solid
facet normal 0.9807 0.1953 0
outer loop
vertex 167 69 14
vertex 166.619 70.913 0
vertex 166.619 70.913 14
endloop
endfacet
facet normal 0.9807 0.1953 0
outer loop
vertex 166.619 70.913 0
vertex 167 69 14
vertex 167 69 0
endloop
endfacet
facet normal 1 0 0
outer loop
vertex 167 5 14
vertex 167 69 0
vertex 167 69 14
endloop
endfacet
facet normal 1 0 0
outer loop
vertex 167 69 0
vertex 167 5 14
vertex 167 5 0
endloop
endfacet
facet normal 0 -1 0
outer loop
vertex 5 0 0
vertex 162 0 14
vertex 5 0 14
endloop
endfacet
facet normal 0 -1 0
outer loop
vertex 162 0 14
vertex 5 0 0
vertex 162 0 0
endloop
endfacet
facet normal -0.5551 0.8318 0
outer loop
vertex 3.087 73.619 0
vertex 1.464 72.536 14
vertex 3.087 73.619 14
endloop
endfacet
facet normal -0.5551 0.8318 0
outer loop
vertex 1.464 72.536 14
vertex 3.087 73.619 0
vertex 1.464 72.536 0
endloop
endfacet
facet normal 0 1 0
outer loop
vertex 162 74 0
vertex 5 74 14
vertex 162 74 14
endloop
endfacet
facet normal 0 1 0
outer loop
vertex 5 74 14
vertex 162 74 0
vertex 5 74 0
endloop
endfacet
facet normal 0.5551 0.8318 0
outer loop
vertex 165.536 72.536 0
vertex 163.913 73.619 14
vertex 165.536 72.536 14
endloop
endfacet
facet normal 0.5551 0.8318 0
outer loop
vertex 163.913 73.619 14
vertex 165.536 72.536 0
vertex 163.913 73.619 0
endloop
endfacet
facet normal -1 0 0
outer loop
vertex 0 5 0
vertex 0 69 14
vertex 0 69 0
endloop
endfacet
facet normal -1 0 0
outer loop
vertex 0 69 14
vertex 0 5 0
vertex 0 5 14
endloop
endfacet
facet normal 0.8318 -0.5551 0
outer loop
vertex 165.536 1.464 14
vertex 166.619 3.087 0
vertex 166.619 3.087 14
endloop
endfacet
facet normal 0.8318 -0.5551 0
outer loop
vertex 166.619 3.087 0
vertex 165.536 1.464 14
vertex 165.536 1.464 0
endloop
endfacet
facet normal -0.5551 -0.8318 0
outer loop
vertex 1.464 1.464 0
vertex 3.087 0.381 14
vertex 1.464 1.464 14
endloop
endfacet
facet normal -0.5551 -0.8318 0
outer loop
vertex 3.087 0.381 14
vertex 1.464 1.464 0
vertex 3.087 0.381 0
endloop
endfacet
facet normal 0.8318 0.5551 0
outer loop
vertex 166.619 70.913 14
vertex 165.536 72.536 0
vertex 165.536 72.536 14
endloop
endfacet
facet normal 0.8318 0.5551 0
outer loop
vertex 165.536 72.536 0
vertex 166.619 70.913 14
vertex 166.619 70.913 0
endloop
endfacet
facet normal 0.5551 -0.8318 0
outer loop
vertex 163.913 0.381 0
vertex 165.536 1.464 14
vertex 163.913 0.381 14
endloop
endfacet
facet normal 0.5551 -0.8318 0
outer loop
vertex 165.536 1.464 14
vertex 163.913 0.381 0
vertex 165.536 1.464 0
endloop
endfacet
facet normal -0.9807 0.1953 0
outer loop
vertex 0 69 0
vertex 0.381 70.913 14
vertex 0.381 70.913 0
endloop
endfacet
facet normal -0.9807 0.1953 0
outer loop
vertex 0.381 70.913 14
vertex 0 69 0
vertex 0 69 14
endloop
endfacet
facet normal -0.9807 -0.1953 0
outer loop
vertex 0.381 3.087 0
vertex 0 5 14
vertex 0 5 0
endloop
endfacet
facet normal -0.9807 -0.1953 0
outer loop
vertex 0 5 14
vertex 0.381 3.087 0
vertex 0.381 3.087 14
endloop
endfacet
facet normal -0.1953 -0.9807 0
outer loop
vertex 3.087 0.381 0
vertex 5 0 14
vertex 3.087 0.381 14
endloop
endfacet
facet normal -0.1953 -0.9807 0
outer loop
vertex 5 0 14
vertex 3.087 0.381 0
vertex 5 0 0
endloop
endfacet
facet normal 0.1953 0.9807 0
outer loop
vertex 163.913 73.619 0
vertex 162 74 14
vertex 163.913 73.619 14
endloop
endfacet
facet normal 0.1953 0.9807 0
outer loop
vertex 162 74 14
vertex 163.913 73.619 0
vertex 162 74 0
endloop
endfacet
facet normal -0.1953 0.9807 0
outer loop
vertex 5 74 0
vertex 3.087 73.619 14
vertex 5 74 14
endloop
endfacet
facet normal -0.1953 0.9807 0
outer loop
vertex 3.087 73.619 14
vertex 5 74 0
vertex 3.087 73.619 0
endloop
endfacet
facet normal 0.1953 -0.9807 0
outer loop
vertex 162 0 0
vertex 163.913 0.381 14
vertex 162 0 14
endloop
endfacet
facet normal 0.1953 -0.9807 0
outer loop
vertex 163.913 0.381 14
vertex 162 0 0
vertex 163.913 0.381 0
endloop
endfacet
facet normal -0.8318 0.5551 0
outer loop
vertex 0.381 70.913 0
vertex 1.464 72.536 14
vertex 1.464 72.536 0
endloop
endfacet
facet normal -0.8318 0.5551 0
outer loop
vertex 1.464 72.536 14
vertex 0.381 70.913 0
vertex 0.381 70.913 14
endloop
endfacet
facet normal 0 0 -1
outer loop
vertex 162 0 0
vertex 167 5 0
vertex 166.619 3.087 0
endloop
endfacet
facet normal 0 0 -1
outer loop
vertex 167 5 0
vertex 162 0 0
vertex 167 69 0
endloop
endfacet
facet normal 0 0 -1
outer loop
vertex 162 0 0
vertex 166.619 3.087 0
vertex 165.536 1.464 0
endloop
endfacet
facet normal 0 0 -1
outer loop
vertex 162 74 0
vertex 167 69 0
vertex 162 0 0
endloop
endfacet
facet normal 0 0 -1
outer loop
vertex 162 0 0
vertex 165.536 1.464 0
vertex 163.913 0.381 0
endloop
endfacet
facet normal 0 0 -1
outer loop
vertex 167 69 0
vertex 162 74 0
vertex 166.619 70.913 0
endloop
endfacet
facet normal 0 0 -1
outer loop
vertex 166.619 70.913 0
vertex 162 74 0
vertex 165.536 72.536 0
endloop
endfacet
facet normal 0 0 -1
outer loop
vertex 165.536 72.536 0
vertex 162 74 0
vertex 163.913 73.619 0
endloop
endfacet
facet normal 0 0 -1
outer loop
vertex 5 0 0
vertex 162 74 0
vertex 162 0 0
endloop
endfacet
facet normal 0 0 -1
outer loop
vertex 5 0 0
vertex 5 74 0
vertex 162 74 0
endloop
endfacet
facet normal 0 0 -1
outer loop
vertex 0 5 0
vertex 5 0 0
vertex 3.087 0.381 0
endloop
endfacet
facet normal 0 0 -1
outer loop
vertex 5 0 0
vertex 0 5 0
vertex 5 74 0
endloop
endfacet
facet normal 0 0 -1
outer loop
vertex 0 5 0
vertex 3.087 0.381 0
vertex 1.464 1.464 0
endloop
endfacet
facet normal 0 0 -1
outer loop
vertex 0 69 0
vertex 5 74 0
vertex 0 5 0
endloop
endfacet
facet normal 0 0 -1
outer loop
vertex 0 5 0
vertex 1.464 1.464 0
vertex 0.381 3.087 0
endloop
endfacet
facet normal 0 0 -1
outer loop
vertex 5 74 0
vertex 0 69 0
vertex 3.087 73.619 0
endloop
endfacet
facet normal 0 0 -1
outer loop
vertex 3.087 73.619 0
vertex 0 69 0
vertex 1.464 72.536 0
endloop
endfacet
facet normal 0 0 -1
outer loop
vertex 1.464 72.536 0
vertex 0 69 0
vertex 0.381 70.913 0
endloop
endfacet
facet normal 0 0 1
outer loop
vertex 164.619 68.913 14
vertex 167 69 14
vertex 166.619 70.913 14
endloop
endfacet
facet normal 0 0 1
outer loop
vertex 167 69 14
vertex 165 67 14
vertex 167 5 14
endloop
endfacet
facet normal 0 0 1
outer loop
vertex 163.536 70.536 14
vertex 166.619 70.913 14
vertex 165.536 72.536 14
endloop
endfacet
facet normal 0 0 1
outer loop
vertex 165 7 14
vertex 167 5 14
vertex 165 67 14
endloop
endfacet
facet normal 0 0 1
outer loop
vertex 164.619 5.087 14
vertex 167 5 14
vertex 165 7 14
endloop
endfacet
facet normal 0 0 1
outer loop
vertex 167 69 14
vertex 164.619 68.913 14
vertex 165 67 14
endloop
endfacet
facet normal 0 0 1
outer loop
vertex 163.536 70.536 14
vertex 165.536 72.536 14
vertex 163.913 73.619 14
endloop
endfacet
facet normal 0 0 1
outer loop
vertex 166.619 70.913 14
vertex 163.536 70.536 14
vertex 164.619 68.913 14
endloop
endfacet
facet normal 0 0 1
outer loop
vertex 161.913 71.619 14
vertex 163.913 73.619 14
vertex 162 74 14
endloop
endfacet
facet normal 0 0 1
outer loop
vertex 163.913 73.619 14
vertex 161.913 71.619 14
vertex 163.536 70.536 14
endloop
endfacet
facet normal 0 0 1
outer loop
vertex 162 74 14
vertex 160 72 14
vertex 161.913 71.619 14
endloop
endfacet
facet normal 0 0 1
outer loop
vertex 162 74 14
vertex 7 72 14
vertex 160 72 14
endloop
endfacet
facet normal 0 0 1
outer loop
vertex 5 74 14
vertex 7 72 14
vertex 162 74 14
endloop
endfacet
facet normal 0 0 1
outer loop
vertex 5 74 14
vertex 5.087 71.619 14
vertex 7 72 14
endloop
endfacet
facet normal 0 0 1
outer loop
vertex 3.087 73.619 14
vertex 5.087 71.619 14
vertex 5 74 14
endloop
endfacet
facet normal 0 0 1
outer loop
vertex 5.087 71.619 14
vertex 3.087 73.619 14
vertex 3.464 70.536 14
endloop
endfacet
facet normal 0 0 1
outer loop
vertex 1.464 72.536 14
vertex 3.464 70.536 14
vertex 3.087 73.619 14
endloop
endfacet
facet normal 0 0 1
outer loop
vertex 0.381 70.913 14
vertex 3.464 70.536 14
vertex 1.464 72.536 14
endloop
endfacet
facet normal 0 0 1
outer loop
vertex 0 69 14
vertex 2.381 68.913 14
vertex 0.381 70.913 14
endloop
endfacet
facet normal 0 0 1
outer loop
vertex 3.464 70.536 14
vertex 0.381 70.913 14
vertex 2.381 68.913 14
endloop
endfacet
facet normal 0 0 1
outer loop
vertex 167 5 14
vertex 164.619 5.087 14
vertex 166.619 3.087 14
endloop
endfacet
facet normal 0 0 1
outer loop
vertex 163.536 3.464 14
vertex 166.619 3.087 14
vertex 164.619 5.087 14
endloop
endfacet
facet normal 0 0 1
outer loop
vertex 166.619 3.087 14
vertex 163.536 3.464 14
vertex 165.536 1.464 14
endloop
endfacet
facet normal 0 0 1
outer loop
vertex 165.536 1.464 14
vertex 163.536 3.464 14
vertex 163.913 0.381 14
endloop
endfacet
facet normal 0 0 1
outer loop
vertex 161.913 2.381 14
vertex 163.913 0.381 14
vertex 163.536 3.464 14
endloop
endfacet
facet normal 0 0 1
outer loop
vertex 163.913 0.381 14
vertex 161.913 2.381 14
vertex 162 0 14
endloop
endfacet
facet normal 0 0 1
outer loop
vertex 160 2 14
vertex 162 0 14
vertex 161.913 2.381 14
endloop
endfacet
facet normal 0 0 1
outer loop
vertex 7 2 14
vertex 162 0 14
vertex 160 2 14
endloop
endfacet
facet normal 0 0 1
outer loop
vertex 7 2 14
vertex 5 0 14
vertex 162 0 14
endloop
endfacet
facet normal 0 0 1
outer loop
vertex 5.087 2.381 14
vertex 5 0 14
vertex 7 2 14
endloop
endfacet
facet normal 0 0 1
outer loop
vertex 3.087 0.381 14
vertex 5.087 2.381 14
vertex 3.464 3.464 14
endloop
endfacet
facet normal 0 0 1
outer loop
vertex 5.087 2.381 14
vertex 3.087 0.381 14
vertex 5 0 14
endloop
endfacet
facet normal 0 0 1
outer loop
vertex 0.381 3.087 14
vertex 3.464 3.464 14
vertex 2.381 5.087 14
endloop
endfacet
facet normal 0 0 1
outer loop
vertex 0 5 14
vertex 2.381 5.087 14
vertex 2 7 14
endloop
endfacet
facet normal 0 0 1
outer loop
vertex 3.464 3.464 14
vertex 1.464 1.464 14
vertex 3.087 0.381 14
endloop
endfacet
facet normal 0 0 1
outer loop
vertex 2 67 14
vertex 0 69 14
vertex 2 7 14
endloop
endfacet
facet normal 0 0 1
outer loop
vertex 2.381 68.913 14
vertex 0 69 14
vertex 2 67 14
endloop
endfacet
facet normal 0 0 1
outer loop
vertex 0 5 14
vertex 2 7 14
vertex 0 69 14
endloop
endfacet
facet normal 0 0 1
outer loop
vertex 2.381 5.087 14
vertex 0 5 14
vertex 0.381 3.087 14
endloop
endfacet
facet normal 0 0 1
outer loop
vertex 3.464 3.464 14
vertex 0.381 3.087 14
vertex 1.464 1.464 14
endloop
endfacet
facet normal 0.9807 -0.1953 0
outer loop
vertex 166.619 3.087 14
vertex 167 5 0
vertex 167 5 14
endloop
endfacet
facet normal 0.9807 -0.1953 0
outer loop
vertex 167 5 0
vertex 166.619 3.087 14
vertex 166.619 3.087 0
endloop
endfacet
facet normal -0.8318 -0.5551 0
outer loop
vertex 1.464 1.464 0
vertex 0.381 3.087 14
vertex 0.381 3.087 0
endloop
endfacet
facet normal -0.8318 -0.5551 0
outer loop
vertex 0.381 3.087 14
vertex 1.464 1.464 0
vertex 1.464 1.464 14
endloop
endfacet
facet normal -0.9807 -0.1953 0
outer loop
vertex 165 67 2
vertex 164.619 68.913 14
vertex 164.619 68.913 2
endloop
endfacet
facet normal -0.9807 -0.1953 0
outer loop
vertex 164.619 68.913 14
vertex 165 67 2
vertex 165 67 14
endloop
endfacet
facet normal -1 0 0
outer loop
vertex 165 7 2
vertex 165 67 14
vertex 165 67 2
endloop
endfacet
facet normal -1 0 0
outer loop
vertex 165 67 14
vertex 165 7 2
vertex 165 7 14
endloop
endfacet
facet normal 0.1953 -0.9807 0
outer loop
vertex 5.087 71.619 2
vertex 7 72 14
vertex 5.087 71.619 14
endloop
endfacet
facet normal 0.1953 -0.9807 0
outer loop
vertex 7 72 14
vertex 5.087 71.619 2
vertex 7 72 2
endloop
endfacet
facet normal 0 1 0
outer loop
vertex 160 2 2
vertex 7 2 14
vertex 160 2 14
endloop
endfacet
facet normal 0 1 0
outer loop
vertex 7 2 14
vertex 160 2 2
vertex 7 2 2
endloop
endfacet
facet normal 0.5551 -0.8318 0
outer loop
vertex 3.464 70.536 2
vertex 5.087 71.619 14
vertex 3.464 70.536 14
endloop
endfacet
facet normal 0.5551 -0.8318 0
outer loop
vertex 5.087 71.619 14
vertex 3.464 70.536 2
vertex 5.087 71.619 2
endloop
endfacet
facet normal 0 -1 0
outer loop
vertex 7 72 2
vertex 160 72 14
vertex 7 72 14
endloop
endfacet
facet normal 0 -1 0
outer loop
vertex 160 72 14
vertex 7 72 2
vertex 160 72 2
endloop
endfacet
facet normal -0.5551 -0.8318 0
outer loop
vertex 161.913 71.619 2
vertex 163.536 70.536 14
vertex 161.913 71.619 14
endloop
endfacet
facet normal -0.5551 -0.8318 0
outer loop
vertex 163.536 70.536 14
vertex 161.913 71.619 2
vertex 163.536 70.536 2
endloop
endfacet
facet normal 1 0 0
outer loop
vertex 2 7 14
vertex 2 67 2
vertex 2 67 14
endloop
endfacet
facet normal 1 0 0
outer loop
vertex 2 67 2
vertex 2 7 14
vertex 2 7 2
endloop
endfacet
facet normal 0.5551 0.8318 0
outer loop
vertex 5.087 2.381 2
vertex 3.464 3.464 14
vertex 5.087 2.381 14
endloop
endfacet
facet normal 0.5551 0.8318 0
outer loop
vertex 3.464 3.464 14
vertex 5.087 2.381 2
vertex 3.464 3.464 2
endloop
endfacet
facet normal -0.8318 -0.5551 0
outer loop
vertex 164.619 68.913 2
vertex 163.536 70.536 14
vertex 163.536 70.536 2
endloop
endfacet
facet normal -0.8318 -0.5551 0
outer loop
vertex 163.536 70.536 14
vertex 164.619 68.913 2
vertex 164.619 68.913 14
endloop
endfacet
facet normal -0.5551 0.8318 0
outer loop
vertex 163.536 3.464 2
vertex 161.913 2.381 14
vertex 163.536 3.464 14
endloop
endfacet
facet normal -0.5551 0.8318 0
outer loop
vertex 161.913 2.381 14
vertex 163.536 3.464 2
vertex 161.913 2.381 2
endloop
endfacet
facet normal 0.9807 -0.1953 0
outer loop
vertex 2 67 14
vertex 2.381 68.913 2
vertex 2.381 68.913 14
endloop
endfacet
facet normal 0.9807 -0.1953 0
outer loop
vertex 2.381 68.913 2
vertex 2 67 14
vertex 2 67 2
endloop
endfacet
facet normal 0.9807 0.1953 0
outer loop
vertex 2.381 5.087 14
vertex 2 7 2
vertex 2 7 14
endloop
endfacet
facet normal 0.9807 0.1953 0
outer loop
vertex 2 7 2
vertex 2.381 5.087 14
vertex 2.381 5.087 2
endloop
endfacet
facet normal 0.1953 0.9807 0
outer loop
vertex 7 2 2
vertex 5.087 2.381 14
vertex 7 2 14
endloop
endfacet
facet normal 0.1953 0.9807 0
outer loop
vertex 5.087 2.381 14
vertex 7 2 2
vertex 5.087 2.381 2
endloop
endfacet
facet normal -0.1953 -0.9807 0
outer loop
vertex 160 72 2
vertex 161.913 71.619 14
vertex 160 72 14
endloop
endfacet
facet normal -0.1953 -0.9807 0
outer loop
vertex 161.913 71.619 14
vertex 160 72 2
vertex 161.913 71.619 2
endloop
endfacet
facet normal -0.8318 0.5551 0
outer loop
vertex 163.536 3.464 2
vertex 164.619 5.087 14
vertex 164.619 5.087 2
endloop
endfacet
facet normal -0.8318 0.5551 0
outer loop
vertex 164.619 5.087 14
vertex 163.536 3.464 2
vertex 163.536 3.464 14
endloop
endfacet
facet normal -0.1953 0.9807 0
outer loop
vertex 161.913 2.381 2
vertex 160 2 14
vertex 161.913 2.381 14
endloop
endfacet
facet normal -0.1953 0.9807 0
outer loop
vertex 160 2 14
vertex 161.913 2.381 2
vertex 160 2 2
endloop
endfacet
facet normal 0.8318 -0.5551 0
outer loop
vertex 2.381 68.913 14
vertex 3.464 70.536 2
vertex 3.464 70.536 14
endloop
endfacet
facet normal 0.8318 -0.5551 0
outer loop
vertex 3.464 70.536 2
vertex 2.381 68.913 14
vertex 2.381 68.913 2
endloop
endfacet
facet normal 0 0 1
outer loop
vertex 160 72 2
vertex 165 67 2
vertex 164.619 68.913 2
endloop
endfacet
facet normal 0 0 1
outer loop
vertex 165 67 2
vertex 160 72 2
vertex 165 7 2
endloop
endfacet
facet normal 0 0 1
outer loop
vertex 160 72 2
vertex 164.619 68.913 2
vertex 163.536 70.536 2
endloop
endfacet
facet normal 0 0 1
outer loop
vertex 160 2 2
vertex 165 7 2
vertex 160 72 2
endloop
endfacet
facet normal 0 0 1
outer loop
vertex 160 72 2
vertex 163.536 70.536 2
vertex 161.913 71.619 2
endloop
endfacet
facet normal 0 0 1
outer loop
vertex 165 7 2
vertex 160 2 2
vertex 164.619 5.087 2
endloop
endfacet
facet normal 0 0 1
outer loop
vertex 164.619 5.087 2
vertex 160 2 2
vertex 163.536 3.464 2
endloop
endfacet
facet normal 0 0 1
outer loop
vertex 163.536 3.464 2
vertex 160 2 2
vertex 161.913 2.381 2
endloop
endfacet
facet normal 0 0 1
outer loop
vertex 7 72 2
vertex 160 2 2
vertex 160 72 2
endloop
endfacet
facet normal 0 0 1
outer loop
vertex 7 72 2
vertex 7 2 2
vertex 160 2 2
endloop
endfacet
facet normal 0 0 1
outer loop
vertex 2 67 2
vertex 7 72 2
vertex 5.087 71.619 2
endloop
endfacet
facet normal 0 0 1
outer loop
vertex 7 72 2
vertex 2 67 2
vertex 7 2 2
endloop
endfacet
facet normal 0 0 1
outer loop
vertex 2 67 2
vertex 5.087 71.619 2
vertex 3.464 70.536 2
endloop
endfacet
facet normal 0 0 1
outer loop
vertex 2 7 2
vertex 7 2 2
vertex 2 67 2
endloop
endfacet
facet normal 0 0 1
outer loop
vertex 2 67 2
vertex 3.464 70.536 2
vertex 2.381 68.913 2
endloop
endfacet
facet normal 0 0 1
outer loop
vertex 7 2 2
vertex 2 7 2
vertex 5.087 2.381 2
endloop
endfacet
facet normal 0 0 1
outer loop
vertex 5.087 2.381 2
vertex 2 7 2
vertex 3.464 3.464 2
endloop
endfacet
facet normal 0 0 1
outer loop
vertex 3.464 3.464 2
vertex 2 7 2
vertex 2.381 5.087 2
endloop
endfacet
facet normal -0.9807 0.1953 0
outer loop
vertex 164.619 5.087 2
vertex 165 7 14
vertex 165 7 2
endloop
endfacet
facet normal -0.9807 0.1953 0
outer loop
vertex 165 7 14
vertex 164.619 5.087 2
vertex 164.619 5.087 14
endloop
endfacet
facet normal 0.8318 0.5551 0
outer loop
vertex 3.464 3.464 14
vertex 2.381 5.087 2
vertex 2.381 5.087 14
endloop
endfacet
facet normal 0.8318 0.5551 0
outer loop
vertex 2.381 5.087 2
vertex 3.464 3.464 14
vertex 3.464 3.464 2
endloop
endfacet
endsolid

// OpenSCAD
// Parameterized Tray - Rounded Box with Thickness
// Dimensions: Width x Breadth x Height with wall thickness and corner radius

// Parameters
width = 167;     // Outer width (mm)
breadth = 74;    // Outer breadth/depth (mm)
height = 14;     // Outer height (mm)
thickness = 2;  // Wall thickness (mm)
width2 = width - (2*thickness);
breadth2 = breadth - (2*thickness);
height2 = 40;    // Inner height (mm)

radius = 5;      // Corner radius (mm)
radius2 = 5;

// Note: Ensure thickness < width/2, breadth/2, and radius < thickness/2 for valid geometry

// Main tray module
module tray() {
    difference() {
        // Outer shell
        rounded_box(width, breadth, height, radius);

        // Inner cavity (hollow out the tray)
        translate([thickness, thickness, thickness])
            rounded_box(width2, breadth2, height2, radius2);
    }
}

// Helper module for rounded box
module rounded_box(w, b, h, r) {
    hull() {
        // Bottom corners
        translate([r, r, 0]) cylinder(h = h, r = r);
        translate([w - r, r, 0]) cylinder(h = h, r = r);
        translate([r, b - r, 0]) cylinder(h = h, r = r);
        translate([w - r, b - r, 0]) cylinder(h = h, r = r);
    }
}

// Render the tray
tray();
